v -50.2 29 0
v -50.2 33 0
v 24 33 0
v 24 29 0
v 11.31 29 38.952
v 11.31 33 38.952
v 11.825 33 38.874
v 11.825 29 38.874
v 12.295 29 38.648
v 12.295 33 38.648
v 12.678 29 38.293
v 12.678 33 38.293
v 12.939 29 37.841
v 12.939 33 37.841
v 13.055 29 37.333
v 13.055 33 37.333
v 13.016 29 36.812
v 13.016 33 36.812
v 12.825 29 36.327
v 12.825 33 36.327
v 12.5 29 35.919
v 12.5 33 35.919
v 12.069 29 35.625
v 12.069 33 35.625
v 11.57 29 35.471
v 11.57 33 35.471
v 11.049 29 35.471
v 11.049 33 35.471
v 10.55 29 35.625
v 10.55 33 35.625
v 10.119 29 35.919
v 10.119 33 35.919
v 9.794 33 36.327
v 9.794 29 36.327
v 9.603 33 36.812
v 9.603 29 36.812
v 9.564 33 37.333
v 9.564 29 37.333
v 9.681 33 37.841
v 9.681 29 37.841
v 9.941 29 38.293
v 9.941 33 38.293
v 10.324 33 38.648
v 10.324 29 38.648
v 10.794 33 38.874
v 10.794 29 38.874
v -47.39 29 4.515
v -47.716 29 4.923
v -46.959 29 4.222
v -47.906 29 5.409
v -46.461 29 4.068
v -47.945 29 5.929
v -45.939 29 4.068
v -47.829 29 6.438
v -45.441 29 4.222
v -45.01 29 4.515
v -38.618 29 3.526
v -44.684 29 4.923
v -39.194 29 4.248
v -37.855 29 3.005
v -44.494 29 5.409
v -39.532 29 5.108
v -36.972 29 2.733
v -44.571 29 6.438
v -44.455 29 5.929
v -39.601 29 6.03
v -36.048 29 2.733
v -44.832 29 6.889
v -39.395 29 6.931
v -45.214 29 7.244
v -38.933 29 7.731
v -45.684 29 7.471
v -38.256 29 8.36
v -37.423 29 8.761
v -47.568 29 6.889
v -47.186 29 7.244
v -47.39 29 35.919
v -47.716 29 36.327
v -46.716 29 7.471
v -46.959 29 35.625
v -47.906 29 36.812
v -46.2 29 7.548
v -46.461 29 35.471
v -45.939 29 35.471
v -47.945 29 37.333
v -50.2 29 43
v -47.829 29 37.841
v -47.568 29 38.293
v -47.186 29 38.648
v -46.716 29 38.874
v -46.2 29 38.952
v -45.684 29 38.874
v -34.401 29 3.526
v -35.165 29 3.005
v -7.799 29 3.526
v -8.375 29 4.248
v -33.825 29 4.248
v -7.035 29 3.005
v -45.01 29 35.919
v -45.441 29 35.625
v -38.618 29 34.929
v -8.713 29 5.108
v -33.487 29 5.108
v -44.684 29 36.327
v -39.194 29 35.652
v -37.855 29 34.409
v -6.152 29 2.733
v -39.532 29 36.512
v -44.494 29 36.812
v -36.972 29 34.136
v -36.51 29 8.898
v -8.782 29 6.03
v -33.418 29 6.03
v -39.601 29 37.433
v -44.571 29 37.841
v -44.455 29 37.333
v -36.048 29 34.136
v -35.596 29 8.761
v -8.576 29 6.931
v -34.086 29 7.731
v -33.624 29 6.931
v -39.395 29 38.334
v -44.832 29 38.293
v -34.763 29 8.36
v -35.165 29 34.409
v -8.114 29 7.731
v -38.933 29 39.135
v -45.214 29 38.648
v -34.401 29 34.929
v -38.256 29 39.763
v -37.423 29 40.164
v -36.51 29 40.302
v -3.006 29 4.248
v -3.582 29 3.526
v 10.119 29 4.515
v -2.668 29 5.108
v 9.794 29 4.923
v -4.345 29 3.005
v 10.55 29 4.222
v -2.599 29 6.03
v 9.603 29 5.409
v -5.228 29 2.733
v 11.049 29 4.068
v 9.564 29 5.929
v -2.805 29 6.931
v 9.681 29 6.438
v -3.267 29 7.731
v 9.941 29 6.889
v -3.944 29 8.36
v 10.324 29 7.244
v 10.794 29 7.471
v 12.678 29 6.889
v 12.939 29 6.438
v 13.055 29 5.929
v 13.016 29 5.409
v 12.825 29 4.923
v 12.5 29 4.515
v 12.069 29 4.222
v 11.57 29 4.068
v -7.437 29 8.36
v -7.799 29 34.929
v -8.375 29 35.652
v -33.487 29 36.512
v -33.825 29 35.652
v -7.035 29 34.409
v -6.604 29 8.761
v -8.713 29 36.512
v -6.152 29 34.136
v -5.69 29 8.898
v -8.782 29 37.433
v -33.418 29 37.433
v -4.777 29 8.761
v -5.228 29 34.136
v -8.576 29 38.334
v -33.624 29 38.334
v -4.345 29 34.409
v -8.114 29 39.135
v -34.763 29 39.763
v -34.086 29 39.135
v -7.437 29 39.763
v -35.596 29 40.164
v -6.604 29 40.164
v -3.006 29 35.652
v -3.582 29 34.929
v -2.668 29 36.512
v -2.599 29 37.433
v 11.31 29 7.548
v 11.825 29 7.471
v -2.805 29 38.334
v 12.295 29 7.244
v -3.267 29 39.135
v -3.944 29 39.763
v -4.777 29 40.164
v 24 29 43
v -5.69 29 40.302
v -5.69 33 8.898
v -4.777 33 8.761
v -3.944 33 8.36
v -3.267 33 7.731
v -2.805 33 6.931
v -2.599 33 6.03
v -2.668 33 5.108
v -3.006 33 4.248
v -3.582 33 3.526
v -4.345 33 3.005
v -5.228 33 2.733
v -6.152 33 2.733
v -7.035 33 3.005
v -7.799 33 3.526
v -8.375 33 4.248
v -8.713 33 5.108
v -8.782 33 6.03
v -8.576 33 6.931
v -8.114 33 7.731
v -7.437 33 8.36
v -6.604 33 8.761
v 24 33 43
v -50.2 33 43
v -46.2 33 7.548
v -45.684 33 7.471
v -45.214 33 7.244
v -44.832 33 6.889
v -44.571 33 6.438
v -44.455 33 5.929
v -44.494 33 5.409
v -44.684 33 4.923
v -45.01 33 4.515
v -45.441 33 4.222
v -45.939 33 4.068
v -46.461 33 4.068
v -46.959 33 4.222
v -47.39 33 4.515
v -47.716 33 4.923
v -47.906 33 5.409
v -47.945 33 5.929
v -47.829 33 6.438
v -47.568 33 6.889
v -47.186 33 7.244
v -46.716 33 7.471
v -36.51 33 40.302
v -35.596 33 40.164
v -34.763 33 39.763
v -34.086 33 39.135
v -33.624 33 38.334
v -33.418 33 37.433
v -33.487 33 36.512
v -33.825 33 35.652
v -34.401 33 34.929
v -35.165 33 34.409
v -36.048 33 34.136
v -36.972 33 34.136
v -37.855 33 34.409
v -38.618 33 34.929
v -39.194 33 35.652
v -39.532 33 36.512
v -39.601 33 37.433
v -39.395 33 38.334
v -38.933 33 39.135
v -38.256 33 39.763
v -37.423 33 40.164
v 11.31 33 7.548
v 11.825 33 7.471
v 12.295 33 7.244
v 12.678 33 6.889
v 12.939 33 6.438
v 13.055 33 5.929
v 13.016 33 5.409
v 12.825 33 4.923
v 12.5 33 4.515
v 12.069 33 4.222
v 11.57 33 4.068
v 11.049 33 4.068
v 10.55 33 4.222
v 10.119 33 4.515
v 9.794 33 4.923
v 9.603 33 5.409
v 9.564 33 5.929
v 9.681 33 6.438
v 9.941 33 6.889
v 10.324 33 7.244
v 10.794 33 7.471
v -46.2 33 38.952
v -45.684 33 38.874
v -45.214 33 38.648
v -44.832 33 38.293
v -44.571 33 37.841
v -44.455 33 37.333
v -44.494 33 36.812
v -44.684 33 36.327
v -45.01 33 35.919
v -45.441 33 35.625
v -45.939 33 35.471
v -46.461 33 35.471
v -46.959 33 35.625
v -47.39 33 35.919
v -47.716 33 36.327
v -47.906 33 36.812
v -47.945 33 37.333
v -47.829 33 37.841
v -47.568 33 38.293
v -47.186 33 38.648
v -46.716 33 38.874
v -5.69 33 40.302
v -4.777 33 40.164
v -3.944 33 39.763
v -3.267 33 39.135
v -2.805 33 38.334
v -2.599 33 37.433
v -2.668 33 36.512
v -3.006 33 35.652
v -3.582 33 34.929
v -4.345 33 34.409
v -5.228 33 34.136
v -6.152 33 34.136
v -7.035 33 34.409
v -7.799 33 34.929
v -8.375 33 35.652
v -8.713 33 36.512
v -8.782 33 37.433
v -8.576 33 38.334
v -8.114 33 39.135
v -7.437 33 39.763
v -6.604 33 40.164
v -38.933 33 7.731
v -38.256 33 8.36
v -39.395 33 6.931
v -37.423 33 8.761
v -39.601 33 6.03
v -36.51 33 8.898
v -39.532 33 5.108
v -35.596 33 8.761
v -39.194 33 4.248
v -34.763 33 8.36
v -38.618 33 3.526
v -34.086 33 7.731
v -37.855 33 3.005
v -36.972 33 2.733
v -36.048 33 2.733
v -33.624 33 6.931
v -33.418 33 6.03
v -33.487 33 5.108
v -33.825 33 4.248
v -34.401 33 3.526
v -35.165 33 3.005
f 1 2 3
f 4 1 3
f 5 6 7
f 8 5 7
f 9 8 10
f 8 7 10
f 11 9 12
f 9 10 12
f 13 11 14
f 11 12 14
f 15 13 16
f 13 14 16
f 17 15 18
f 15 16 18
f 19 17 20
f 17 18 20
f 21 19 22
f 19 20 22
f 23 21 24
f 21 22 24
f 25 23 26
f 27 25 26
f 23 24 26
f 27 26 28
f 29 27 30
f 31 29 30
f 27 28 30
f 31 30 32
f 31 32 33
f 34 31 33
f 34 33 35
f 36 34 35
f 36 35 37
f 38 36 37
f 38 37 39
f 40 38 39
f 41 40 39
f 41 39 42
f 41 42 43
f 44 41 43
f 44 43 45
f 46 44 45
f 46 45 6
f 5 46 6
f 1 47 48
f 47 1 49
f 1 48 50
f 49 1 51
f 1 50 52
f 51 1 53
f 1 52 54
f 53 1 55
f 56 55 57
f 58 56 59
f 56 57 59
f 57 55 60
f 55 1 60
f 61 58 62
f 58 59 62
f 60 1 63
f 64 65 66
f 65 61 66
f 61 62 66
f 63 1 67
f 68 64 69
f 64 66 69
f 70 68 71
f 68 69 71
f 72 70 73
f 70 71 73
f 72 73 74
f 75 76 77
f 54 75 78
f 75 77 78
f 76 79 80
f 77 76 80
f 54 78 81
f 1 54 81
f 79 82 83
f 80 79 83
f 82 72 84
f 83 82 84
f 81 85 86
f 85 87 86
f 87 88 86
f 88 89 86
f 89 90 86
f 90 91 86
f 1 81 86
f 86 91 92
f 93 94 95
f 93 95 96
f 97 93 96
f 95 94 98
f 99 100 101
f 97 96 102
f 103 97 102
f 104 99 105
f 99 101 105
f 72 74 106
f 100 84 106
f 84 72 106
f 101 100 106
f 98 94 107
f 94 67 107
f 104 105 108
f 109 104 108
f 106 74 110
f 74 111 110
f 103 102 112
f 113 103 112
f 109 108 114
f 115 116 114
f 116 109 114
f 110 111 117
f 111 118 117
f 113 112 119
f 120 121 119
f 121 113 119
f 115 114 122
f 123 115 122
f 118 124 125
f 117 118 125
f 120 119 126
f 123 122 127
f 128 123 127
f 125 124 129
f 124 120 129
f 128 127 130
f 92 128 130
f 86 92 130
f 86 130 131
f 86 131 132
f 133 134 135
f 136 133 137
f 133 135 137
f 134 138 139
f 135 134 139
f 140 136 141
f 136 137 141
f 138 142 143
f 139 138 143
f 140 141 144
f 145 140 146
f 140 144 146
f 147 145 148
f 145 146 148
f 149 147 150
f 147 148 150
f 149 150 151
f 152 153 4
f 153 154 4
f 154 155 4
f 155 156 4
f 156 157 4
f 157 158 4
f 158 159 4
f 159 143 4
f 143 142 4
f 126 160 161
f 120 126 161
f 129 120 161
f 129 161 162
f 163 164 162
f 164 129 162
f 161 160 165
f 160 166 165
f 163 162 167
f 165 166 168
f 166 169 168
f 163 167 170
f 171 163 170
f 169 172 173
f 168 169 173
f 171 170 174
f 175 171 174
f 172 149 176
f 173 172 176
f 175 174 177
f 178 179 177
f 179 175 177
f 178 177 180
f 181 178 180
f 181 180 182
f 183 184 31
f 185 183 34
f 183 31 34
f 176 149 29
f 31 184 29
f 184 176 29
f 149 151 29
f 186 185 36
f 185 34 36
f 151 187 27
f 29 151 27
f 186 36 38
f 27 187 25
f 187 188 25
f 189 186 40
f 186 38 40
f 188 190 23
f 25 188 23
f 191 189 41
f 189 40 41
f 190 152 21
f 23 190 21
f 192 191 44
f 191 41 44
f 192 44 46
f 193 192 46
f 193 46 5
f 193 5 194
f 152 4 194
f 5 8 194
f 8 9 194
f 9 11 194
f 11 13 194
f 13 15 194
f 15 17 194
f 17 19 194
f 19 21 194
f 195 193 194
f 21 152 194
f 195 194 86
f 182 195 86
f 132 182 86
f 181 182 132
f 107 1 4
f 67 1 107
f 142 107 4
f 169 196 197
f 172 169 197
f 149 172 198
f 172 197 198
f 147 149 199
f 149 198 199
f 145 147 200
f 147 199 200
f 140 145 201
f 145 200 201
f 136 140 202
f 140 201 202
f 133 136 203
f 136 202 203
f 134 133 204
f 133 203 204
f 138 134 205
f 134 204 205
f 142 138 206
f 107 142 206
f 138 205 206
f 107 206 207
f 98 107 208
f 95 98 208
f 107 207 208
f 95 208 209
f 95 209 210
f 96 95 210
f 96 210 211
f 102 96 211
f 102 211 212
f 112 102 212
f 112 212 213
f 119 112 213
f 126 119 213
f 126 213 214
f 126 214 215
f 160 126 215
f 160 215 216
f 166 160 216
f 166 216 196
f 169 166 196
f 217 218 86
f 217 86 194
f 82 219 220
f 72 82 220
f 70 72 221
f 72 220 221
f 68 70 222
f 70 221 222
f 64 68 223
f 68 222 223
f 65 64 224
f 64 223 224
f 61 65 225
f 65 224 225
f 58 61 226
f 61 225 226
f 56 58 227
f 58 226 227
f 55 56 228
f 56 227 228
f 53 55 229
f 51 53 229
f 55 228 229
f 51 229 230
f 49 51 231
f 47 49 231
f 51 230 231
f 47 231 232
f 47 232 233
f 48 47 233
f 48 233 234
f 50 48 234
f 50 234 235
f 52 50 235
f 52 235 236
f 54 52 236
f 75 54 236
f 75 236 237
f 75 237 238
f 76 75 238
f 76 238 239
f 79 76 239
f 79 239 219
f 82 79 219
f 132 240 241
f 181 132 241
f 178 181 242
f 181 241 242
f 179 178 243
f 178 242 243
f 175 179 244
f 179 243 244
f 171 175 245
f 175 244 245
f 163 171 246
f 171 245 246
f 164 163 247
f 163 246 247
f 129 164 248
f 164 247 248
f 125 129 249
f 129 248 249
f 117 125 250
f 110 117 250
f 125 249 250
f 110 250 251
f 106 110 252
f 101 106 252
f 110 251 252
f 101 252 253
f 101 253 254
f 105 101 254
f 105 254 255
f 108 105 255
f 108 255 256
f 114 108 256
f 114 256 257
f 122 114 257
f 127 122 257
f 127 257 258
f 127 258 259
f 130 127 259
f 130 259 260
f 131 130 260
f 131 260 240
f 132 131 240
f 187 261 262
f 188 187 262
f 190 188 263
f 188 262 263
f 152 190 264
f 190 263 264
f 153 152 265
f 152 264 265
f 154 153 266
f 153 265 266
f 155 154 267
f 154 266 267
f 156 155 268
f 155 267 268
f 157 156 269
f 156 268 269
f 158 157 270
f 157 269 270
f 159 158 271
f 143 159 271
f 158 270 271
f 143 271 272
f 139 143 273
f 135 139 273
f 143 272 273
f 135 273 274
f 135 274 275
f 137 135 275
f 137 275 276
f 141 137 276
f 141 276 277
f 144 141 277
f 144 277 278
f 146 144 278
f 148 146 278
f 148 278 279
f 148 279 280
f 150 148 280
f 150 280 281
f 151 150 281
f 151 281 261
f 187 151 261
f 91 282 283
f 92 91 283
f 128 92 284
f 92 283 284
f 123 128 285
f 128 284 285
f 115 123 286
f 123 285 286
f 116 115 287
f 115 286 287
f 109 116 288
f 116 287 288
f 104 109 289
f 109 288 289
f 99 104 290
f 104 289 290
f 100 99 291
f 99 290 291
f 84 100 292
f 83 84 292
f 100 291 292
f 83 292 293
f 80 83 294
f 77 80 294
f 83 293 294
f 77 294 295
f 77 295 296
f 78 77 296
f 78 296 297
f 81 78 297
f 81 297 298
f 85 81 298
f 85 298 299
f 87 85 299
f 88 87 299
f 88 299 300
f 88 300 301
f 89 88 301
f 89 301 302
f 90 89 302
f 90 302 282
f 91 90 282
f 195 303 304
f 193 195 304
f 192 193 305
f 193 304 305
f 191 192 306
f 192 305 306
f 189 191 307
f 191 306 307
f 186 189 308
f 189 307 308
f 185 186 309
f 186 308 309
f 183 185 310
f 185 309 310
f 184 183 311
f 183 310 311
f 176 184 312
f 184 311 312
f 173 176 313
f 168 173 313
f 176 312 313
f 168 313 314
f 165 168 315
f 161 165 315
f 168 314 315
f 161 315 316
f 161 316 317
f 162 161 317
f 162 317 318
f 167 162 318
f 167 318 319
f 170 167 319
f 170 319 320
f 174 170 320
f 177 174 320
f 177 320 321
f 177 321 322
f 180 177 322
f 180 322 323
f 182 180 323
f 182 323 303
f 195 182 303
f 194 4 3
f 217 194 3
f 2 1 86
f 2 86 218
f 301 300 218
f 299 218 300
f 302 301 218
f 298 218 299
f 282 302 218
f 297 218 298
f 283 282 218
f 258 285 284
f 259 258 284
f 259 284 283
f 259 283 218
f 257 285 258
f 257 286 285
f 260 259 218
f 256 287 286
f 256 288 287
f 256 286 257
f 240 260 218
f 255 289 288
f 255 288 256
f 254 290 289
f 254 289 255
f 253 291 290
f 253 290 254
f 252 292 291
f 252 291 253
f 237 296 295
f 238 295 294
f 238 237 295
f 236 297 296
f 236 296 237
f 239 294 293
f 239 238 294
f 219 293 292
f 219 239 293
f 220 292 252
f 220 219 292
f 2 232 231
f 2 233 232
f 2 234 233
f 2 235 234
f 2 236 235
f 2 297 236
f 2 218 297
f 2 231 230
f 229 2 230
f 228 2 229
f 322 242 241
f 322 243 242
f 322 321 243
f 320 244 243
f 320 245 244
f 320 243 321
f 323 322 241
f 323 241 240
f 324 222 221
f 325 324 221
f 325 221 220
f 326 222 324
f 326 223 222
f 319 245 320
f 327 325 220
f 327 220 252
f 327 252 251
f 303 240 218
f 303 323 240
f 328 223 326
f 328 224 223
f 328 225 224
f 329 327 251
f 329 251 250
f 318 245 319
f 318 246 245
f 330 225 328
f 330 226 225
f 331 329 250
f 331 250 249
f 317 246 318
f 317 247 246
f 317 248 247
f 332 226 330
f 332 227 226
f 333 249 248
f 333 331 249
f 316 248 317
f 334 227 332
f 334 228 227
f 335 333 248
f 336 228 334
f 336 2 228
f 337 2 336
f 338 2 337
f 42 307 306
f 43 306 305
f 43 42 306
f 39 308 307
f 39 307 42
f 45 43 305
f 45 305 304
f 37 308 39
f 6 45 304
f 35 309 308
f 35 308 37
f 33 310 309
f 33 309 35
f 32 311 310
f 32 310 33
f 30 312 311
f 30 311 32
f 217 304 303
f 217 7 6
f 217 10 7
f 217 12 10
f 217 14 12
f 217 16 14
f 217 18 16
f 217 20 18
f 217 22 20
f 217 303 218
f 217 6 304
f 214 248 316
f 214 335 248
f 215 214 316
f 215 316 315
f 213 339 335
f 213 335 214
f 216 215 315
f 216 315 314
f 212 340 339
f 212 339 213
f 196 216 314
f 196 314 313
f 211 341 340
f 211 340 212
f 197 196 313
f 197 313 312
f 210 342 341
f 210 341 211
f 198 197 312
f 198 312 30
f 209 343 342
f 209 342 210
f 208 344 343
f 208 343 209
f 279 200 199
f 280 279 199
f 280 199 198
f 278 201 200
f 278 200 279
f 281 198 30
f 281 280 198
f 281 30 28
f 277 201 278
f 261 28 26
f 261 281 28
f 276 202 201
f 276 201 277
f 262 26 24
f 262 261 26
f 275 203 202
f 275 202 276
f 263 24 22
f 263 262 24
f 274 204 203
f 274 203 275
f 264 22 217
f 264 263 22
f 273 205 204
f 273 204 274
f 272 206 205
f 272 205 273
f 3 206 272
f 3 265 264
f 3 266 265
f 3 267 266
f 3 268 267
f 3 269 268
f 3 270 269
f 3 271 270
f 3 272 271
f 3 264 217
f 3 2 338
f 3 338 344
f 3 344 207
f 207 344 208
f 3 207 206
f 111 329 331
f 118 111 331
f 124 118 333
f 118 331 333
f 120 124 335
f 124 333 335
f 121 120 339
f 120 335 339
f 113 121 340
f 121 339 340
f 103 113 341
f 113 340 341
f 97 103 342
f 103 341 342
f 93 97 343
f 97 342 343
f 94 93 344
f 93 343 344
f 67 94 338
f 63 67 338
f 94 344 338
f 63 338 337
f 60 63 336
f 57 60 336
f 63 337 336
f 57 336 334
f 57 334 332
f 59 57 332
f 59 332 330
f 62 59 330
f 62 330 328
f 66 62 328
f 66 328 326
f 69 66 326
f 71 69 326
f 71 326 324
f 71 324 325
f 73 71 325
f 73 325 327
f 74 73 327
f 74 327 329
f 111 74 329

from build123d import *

# Parameters (mm, degrees)
SKETCH1_W           = 74.2
SKETCH1_H           = 46
BOSS_EXTRUDE1_DEPTH = 43
SKETCH2_R           = 11.5
SKETCH2_R_2         = 1.75
SKETCH2_R_3         = 2.5
CUT_EXTRUDE1_DEPTH  = 20
SKETCH3_R           = 3.1
SKETCH3_R_2         = 1.75
CUT_EXTRUDE2_DEPTH  = 15
CUT_EXTRUDE3_DEPTH  = 2.4
SKETCH5_R           = 2.75
CUT_EXTRUDE4_DEPTH  = 12.4


with BuildPart() as part:
    # Sketch1 → Boss-Extrude1 (new body)
    with BuildSketch(Plane.XY):
        with Locations((-13.1, 10)):
            Rectangle(SKETCH1_W, SKETCH1_H)
        Polygon((0, 0), (20, 0), (20, 20), (0, 20), (0, 29), (-42.2, 29), (-42.2, -9), (0, -9), align=None, mode=Mode.SUBTRACT)
    extrude(amount=BOSS_EXTRUDE1_DEPTH)

    # Sketch2 → Cut-Extrude1 (cut)
    with BuildSketch(Plane.XZ.offset(13)):
        with Locations((-21.1, 21.5)):
            Circle(SKETCH2_R)
        with Locations((-36.509600894, 37.201726029)):
            Circle(SKETCH2_R_2)
        with Locations((-5.690399106, 5.798273971)):
            Circle(SKETCH2_R_2)
        with Locations((-36.509600894, 5.798273971)):
            Circle(SKETCH2_R_2)
        with Locations((-5.690399106, 37.201726029)):
            Circle(SKETCH2_R_2)
        with Locations((10, 37.201726029)):
            Circle(SKETCH2_R_3)
        with Locations((10, 5.798273971)):
            Circle(SKETCH2_R_3)
    extrude(amount=-CUT_EXTRUDE1_DEPTH, mode=Mode.SUBTRACT)

    # Sketch3 → Cut-Extrude2 (cut)
    with BuildSketch(Plane(origin=(0, 33, 0), x_dir=(1, 0, 0), z_dir=(0, 1, 0))):
        with Locations(Location((-36.509600894, -5.798273971, 0), (0, 0, 270))):
            Circle(SKETCH3_R)
        with Locations(Location((-5.690399106, -5.798273971, 0), (0, 0, 270))):
            Circle(SKETCH3_R)
        with Locations(Location((-5.690399106, -37.201726029, 0), (0, 0, 270))):
            Circle(SKETCH3_R)
        with Locations(Location((-36.509600894, -37.201726029, 0), (0, 0, 270))):
            Circle(SKETCH3_R)
        with Locations(Location((-46.2, -5.798273971, 0), (0, 0, 270))):
            Circle(SKETCH3_R_2)
        with Locations(Location((-46.2, -37.201726029, 0), (0, 0, 270))):
            Circle(SKETCH3_R_2)
        with Locations(Location((11.309600894, -5.798273971, 0), (0, 0, 270))):
            Circle(SKETCH3_R_2)
        with Locations(Location((11.309600894, -37.201726029, 0), (0, 0, 270))):
            Circle(SKETCH3_R_2)
    extrude(amount=-CUT_EXTRUDE2_DEPTH, mode=Mode.SUBTRACT)


with BuildPart() as body_2:
    # Split1: the piece on the far side of the plane
    add(part.part)
    split(bisect_by=Plane.ZX.offset(29), keep=Keep.BOTTOM)

    # Sketch4 → Cut-Extrude3 (cut)
    with BuildSketch(Plane(origin=(0, 29, 0), x_dir=(1, 0, 0), z_dir=(0, 1, 0))):
        Polygon((-46.2, -2.334172356), (-49.2, -4.066223163), (-49.2, -7.530324778), (-46.2, -9.262375586), (-43.2, -7.530324778), (-43.2, -4.066223163), align=None)
        Polygon((-43.2, -35.469675222), (-46.2, -33.737624414), (-49.2, -35.469675222), (-49.2, -38.933776837), (-46.2, -40.665827644), (-43.2, -38.933776837), align=None)
        Polygon((14.309600894, -4.066223163), (11.309600894, -2.334172356), (8.309600894, -4.066223163), (8.309600894, -7.530324778), (11.309600894, -9.262375586), (14.309600894, -7.530324778), align=None)
        Polygon((14.309600894, -35.469675222), (11.309600894, -33.737624414), (8.309600894, -35.469675222), (8.309600894, -38.933776837), (11.309600894, -40.665827644), (14.309600894, -38.933776837), align=None)
    extrude(amount=-CUT_EXTRUDE3_DEPTH, mode=Mode.SUBTRACT)

    # Sketch5 → Cut-Extrude4 (cut)
    with BuildSketch(Plane(origin=(24, 0, 0), x_dir=(0, 0, -1), z_dir=(1, 0, 0))):
        with Locations(Location((-35.5, 10, 0), (0, 0, 90))):
            Circle(SKETCH5_R)
        with Locations(Location((-7.5, 10, 0), (0, 0, 90))):
            Circle(SKETCH5_R)
    extrude(amount=-CUT_EXTRUDE4_DEPTH, mode=Mode.SUBTRACT)


with BuildPart() as part_1:
    add(part.part)

    # Split1
    split(bisect_by=Plane.ZX.offset(29), keep=Keep.TOP)


solid = part_1.part
